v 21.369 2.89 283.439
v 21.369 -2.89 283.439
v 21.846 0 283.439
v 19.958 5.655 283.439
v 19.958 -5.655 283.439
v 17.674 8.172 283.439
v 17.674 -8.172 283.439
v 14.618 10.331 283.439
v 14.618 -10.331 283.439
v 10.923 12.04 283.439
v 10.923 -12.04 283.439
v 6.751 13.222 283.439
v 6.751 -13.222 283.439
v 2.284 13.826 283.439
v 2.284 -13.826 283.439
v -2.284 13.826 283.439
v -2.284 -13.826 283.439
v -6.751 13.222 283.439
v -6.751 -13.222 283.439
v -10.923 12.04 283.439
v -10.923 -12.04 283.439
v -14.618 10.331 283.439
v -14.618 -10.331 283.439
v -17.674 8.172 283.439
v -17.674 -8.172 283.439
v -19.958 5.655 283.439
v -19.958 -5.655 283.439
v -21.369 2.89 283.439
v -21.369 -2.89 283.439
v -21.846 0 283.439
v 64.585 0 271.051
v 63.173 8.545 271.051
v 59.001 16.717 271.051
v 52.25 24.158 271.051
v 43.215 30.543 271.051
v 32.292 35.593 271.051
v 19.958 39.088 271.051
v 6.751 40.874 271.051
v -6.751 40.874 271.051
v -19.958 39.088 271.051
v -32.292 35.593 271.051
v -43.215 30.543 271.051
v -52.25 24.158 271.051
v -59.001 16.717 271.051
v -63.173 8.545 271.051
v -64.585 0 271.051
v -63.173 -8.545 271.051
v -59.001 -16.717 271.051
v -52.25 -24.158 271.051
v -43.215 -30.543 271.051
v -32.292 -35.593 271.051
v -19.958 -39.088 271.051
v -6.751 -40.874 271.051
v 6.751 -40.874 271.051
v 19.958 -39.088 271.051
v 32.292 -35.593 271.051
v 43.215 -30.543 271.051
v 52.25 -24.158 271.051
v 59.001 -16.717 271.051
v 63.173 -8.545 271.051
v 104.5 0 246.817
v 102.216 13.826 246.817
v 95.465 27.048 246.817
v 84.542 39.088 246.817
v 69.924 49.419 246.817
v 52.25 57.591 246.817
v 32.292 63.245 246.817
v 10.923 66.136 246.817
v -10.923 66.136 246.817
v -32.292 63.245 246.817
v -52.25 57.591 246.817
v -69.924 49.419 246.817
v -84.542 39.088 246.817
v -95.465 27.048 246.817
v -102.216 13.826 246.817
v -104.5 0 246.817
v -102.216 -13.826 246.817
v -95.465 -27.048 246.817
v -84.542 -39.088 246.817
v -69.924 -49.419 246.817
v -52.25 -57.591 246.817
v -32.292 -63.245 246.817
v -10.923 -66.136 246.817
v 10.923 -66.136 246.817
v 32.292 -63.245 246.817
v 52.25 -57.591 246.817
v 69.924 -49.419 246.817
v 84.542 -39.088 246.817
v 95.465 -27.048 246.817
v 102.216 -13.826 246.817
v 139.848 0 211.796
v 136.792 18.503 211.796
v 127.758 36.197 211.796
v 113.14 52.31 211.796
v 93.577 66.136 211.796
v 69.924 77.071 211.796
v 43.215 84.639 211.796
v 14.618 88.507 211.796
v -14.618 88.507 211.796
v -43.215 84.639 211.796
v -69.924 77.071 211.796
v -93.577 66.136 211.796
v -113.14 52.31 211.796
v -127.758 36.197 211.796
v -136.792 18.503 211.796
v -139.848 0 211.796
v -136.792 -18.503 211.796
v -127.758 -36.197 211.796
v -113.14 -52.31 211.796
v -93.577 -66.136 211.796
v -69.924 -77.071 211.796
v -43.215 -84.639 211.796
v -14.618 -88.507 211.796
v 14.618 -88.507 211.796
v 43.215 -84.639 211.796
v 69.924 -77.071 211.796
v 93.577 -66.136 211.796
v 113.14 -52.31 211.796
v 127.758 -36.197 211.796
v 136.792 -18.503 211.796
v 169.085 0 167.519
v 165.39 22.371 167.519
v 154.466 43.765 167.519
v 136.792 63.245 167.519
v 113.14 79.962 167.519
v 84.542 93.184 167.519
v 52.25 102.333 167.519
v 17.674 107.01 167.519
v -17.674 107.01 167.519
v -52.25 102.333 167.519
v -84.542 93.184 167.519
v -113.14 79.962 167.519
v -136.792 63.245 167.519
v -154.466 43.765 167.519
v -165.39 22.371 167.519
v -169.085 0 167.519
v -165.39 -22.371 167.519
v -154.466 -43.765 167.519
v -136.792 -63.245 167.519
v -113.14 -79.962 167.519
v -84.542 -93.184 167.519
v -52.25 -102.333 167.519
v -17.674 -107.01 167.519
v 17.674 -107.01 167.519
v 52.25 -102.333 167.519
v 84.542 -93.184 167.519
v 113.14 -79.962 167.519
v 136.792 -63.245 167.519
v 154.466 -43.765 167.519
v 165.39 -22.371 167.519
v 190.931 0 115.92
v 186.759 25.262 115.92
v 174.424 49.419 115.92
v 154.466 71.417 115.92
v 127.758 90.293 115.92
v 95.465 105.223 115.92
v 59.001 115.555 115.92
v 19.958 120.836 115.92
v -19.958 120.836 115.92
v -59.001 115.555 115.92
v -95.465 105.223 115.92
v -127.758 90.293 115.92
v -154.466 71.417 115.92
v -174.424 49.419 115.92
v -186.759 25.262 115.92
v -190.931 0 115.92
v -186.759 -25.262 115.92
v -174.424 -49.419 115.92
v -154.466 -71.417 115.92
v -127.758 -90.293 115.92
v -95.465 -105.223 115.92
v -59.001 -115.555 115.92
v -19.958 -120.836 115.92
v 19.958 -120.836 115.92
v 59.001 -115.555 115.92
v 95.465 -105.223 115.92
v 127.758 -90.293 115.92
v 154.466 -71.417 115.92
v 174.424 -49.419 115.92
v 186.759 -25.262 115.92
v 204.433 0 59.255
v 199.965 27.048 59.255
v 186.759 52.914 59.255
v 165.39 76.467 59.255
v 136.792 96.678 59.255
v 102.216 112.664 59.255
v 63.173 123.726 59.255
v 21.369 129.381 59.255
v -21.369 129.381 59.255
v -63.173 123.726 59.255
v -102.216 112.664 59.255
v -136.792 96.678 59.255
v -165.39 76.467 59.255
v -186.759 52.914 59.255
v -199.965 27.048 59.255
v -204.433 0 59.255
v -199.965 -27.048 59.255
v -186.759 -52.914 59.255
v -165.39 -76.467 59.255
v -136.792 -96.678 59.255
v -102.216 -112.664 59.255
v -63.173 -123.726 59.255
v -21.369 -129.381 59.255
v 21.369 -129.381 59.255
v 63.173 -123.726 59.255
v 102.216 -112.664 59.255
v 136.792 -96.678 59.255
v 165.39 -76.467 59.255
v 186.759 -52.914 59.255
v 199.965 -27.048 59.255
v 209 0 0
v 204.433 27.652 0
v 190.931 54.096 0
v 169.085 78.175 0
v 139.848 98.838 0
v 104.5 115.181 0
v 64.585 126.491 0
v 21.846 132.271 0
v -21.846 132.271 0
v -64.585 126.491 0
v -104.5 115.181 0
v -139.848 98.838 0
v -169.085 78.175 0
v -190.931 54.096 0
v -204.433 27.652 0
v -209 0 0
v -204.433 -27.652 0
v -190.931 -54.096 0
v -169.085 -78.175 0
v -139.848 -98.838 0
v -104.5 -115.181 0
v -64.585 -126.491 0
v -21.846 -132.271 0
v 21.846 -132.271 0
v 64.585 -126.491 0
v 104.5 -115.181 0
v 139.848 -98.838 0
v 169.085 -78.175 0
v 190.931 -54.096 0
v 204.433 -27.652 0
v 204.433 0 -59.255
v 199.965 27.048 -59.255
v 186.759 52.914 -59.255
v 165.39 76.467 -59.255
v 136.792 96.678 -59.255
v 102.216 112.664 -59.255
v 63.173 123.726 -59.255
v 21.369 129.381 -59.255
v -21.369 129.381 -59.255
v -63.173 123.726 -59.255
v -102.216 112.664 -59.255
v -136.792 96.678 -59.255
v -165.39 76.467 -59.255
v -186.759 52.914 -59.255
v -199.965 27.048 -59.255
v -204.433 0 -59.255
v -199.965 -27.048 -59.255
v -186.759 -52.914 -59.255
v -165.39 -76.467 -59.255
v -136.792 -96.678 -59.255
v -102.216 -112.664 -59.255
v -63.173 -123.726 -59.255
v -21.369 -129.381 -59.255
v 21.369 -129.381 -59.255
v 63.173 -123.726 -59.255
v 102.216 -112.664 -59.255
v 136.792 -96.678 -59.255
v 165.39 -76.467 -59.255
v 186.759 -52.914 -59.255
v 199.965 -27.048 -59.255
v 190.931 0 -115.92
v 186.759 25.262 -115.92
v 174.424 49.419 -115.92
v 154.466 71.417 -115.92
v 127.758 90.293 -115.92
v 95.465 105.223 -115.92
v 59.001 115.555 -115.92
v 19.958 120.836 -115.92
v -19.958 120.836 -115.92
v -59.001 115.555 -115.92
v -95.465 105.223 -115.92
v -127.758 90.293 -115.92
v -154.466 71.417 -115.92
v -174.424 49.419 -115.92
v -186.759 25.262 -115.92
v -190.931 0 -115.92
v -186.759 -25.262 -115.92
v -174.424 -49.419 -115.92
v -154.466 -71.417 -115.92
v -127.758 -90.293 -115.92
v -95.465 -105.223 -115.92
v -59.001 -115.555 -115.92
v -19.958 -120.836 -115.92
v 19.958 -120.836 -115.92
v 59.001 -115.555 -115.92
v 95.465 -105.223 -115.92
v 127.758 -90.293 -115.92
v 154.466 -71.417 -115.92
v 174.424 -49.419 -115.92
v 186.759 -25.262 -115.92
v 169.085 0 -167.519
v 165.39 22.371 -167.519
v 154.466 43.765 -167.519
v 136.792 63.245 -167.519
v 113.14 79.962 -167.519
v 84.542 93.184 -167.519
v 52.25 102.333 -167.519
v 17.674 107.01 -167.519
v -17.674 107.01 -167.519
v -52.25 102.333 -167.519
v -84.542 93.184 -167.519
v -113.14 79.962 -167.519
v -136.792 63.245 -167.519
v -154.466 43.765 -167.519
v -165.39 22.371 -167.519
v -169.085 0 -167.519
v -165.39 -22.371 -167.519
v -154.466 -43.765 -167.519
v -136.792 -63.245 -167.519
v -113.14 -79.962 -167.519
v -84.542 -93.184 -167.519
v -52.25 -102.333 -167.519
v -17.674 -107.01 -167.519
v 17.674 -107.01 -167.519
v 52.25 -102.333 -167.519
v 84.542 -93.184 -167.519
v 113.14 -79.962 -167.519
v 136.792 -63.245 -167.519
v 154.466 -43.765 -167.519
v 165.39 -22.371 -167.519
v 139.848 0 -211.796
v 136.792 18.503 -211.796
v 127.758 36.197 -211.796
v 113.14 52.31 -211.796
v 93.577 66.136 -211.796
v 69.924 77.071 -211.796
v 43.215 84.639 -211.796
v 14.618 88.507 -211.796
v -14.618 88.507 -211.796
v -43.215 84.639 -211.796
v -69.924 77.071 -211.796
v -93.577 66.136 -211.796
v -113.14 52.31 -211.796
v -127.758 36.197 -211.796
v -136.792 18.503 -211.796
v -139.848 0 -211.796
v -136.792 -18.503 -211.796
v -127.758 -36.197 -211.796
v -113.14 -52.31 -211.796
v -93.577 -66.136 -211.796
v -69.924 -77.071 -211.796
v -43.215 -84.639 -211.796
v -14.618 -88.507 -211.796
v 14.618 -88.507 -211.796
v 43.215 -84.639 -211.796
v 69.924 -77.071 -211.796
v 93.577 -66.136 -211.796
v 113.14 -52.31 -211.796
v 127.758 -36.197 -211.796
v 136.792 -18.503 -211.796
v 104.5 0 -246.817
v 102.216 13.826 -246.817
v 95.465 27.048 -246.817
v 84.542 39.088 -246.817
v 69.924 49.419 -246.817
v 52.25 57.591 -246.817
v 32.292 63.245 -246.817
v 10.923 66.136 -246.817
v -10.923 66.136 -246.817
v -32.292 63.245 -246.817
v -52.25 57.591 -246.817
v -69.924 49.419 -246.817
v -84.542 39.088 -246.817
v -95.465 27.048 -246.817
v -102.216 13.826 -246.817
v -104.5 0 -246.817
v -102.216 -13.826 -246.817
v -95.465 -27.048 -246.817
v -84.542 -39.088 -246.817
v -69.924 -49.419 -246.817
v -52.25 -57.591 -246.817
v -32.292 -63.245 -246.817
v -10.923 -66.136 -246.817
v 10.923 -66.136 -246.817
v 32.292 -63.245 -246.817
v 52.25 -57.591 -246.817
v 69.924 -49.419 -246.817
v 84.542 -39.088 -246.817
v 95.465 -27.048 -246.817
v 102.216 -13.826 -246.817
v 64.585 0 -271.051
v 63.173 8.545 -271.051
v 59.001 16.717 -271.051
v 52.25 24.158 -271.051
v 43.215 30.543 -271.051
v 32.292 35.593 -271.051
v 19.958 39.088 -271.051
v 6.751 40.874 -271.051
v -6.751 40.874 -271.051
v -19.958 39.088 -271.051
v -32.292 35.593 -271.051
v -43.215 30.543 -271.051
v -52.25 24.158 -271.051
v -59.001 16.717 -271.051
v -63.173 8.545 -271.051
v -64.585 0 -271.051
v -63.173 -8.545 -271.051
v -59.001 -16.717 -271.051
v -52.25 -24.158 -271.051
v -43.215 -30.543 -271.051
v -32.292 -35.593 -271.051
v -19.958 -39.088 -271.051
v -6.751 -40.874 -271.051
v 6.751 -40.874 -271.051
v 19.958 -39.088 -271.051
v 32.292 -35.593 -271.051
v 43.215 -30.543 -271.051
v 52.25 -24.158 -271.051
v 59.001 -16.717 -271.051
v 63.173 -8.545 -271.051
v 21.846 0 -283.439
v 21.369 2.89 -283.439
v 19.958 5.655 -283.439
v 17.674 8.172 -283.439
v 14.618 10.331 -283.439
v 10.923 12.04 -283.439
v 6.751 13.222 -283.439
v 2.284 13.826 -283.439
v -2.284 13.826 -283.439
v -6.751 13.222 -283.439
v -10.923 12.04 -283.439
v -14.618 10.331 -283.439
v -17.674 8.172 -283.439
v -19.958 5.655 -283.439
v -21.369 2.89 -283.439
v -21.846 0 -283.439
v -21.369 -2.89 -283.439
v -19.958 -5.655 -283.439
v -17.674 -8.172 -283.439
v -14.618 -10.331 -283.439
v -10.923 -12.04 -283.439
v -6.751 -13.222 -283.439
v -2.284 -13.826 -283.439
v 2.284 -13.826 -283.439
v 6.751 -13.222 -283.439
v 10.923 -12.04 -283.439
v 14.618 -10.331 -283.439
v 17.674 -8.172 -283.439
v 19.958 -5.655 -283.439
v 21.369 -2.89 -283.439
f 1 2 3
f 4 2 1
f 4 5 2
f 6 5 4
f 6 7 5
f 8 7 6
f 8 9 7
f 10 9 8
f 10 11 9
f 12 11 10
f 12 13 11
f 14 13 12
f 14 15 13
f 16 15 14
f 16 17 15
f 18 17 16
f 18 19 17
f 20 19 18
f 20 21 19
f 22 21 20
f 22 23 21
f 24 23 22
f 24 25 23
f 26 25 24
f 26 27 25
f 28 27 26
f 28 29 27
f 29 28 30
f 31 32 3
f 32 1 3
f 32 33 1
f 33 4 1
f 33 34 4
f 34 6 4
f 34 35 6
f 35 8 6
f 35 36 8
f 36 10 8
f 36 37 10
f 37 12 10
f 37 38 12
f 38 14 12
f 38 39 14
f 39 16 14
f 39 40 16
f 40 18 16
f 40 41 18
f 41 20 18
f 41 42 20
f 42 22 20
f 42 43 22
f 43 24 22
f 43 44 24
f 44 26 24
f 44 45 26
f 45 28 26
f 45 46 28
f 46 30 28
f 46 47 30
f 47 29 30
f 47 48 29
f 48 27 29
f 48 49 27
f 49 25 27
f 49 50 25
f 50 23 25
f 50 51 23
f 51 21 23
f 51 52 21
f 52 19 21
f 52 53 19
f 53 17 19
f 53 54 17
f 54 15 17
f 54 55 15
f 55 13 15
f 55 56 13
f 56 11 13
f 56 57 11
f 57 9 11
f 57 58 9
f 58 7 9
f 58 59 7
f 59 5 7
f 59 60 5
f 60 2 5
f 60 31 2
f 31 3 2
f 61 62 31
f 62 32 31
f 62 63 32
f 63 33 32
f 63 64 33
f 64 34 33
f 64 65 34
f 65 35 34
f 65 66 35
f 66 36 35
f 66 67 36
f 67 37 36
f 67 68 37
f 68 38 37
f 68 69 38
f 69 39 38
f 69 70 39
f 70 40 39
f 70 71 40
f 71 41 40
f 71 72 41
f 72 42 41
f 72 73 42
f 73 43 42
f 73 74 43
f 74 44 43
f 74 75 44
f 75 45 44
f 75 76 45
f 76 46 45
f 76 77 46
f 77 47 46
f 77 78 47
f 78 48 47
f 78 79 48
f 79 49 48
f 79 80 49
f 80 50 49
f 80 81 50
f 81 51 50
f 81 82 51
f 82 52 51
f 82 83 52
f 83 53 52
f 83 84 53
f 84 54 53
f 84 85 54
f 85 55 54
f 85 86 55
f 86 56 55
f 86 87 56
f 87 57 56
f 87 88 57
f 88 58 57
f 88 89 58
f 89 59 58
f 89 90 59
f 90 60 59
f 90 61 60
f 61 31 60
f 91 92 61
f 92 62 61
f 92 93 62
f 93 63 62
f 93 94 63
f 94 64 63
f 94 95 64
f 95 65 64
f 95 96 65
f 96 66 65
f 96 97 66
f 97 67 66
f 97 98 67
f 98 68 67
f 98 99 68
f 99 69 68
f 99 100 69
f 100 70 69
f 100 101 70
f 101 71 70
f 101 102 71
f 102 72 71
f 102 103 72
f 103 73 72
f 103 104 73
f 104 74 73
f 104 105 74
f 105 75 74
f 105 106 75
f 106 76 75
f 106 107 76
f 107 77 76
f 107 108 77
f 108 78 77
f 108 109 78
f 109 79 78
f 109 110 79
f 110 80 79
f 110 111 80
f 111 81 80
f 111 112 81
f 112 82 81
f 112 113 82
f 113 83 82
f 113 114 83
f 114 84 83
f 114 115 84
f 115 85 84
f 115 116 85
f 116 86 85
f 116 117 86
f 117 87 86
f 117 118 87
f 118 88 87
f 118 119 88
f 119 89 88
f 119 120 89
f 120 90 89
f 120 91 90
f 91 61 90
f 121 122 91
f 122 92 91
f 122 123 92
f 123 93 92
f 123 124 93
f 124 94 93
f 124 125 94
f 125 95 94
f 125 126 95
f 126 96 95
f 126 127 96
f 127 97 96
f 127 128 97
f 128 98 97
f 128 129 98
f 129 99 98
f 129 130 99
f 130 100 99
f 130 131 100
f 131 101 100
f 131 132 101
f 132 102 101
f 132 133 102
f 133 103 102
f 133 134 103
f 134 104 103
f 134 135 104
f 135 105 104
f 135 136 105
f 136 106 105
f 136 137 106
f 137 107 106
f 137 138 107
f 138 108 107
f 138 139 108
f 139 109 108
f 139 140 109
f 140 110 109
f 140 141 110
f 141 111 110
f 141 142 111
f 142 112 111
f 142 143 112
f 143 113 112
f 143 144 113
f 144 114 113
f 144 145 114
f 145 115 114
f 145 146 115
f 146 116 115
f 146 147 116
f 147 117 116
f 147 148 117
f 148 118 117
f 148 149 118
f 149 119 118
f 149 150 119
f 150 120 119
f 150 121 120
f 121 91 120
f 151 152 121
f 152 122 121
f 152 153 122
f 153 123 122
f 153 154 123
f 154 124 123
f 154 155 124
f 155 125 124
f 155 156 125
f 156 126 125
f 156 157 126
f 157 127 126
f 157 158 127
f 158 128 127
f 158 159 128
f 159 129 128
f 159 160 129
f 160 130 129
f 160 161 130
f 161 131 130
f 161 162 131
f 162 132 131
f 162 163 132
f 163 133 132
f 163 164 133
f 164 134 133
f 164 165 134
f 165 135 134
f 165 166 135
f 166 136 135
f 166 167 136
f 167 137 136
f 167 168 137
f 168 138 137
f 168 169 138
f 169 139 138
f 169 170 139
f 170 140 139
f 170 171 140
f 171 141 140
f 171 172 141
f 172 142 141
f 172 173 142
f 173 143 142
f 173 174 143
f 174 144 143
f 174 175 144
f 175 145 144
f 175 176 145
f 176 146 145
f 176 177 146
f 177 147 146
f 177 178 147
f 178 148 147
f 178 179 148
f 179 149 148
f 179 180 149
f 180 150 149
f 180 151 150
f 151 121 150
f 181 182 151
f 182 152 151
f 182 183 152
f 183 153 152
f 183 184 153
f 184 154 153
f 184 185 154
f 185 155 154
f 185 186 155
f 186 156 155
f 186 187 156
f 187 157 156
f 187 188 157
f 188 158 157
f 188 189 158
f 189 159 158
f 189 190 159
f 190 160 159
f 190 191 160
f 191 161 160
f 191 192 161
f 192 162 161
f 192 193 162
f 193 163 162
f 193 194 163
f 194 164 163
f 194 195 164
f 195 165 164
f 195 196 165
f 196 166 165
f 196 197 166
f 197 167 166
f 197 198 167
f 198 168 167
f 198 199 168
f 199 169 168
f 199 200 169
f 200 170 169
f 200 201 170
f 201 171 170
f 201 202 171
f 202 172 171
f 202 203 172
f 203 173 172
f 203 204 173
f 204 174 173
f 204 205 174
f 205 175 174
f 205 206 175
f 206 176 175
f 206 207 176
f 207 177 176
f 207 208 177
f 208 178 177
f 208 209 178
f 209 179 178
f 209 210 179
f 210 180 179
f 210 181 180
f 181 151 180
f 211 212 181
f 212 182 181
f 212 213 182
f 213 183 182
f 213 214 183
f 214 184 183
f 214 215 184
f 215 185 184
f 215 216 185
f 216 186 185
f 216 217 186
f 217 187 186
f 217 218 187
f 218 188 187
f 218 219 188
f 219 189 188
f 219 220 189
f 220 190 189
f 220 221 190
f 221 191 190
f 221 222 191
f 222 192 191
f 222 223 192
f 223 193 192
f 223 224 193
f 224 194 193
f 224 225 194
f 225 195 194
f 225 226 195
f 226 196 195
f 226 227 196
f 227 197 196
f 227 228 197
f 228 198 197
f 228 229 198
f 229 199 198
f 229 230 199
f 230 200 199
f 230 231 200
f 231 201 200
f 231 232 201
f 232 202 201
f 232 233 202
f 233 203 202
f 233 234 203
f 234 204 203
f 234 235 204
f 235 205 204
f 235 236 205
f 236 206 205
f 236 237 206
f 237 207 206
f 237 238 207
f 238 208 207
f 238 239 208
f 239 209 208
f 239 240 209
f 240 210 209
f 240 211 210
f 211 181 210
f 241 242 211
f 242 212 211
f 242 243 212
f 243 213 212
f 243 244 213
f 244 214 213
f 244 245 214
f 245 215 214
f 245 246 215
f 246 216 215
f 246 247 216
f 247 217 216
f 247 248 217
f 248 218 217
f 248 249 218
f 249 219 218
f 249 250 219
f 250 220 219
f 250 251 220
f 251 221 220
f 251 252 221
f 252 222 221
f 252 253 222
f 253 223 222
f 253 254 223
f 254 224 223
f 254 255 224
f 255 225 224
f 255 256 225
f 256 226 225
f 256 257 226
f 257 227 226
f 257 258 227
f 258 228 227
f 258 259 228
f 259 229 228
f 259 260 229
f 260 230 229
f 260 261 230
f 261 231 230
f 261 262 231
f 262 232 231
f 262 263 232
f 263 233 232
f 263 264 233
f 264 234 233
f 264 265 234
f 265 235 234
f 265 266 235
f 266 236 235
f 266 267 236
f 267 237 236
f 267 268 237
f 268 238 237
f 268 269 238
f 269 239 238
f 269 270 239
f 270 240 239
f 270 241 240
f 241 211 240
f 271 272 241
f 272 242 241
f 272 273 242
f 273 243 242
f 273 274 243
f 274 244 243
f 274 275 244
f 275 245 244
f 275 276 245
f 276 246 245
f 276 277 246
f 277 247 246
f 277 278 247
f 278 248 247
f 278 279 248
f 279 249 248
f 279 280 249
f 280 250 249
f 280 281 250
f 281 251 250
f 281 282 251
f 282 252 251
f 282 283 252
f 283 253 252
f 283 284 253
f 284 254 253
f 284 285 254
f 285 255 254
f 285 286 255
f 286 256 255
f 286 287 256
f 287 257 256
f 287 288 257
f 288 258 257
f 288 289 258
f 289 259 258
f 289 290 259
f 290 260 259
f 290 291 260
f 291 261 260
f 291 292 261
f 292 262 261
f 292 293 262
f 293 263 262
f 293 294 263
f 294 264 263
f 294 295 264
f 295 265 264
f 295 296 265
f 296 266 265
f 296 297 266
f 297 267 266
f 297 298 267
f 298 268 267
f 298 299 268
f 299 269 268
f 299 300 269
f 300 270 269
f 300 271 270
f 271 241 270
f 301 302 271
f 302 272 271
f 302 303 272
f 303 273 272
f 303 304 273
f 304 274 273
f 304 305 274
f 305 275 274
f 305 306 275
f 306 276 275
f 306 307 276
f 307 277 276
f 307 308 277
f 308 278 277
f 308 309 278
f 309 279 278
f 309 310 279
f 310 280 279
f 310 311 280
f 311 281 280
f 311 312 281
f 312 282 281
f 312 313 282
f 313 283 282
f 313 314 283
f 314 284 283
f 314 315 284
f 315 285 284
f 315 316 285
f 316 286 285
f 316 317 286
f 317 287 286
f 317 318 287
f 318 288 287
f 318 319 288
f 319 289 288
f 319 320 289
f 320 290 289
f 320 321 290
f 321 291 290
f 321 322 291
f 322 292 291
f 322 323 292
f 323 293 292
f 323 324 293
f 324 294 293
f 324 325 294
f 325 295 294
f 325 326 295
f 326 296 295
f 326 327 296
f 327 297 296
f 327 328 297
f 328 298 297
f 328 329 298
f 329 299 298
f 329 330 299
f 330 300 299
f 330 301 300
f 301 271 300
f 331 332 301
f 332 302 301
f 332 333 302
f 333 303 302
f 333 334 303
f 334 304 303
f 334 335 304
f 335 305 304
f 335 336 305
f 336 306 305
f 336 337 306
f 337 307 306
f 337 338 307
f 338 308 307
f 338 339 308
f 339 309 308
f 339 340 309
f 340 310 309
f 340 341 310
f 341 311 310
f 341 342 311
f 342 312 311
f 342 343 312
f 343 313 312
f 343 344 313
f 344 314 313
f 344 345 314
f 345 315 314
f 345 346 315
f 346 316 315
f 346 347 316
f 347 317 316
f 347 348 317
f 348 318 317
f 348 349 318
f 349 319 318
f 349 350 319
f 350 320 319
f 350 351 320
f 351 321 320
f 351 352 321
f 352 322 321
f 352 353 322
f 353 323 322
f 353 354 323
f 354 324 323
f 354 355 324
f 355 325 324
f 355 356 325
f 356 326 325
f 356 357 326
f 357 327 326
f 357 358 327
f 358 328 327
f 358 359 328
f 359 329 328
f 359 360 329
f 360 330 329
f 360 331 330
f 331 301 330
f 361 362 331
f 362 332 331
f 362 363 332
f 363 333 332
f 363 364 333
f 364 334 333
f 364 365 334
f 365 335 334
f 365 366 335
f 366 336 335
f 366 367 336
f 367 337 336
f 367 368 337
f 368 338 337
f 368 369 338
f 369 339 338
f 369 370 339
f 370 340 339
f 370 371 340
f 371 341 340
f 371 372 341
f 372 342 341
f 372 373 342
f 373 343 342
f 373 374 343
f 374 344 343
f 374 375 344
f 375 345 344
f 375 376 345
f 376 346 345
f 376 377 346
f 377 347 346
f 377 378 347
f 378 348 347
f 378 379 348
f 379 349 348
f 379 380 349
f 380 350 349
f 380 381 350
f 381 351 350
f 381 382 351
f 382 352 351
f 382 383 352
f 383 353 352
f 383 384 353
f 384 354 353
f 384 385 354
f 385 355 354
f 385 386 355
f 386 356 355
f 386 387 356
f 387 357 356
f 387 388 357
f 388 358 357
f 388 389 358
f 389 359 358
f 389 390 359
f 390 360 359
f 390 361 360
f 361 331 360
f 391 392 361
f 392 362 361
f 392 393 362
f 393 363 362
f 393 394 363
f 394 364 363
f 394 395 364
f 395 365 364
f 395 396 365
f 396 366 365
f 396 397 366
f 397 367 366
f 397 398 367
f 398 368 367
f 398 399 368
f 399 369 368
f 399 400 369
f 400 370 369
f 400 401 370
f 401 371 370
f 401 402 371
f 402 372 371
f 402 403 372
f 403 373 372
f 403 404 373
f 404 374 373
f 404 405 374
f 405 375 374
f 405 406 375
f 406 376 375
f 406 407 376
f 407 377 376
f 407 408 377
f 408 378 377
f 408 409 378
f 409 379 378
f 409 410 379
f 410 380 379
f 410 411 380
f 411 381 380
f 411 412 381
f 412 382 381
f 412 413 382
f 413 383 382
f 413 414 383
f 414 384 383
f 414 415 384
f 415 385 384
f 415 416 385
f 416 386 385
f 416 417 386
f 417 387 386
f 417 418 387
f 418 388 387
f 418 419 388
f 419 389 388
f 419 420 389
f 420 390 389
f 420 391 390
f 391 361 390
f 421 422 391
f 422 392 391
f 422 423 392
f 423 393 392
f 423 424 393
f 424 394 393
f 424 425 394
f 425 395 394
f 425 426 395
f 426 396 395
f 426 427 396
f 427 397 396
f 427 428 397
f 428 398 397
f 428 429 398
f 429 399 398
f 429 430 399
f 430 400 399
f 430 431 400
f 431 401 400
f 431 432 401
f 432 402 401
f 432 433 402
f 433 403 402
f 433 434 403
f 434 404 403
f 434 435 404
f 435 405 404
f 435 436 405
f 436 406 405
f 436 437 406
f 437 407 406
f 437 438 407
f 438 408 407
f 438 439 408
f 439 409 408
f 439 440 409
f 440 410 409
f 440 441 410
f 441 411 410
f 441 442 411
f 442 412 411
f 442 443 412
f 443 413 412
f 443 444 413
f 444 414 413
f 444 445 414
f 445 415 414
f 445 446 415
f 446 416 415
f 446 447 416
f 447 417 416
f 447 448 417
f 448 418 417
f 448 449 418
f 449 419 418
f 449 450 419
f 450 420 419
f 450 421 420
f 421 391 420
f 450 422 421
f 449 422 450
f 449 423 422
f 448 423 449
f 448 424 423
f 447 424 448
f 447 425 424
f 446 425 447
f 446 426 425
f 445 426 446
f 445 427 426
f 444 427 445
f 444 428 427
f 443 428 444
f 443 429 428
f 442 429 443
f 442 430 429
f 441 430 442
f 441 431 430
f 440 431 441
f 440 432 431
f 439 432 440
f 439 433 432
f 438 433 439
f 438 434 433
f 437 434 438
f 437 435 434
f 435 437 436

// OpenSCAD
// Generated by SolidPython 1.0.1 on 2020-07-29 00:46:49


scale(v = [11, 7, 15]) {
	sphere(r = 19);
}
/***********************************************
*********      SolidPython code:      **********
************************************************
 
# import packages: SolidPython
from solid import *
from solid.utils import *
from itertools import chain, combinations, permutations


class Resize:

    def __init__(self, scad_file):
        self.scad_file = scad_file
        #self.scad_file = import_scad(scad_file)
        # cone/cylinder param:
        self.r1 = 0
        self.r2 = 0
        self.h = 0
        # rectangular prism param:
        self.w = 0
        self.l = 0
        # ellipse param:
        self.r = 0

    # import OpenScad code (file name corresponds to shape)


    # classify shape + parameters
    def assign(self, param1, param2, param3):
        if self.scad_file == 'cone.scad':
            self.r1 = param1
            self.r2 = param2
            self.h = param3
        elif self.scad_file == 'cylinder.scad':
            self.r1 = param1
            self.r2 = param2
            self.h = param3
        elif self.scad_file == 'rectangularPrism.scad':
            self.h = param1
            self.l = param2
            self.w = param3
        else:
            self.r = param1
            self.h = param2

    # resize parameters
    def iterate(self):
        x = range(3, 20, 2)
        i = 1
        if self.scad_file == 'cone.scad':
            tempList = list(permutations(x, 2))
            for temp in tempList:
                param1 = temp[0]
                param2 = temp[1]
                filepath = 'produced_scad_files/' + 'cone' + str(param1) + '_' + str(param2) + '_' + '.scad'
                scad_render_to_file(cylinder(h=param1, r1=param2, r2=0), filepath)

        elif self.scad_file == 'cylinder.scad':
            tempList = list(permutations(x, 3))
            for temp in tempList:
                param1 = temp[0]
                param2 = temp[1]
                filepath = 'produced_scad_files/' + 'cylinder' + str(param1) + '_' + str(param2) + '_' + '.scad'
                scad_render_to_file(cylinder(h=param1, r1=param2, r2=param2), filepath)

        elif self.scad_file == 'rectangularPrism.scad':
            tempList = list(permutations(x, 3))
            for temp in tempList:
                param1 = temp[0]
                param2 = temp[1]
                param3 = temp[2]
                filepath = 'produced_scad_files/' + 'rectangularPrism' + str(param1) + '_' + str(param2) + '_' + str(
                    param3) + '.scad'
                scad_render_to_file(cube(size=(param1, param2, param3)), filepath)

        elif self.scad_file == 'ellipse.scad':
            tempList = list(permutations(x, 4))
            for temp in tempList:
                param1 = temp[0]
                param2 = temp[1]
                param3 = temp[2]
                param4 = temp[3]
                filepath = 'produced_scad_files/' + 'ellipse' + str(param1) + '_' + str(param2) + '_' + str(param3) + '_' + str(param4) + '.scad'
                scad_render_to_file(scale([param1, param2, param3])(sphere(r=param4)), filepath)

    def render_to_scadfile(self):
        scad_render_to_file(scad, 'example.scad') 
 
************************************************/
